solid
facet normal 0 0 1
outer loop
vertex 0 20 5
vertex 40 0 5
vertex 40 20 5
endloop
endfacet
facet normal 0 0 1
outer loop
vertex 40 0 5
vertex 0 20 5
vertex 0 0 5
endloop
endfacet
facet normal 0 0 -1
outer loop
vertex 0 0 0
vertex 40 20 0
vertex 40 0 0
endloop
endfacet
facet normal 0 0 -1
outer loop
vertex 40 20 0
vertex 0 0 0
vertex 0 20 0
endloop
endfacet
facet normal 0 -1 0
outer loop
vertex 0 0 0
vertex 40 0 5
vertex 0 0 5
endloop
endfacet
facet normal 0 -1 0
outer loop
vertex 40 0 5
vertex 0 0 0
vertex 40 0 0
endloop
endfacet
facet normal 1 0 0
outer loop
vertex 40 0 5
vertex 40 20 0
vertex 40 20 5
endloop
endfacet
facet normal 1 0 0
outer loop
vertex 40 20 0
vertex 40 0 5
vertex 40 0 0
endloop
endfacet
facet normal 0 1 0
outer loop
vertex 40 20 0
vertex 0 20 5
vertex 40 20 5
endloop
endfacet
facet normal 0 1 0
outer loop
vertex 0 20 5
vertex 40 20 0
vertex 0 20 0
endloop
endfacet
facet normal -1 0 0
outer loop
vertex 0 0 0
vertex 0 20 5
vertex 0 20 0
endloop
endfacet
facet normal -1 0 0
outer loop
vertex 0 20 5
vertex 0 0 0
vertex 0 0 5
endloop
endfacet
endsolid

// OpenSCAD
// Product name: TODO
// Version: v0.1
// Units: millimeters
// Author/source: TODO
// License/commercial status: TODO
// Use mode: personal / classroom / business-commercial / repair-replacement / reference-only
// Safety notes: TODO
// Print notes: TODO
// Slicer notes: verify scale, supports, orientation, and material in Bambu Studio
// Version history:
// - v0.1: placeholder template

width = 40;
depth = 20;
height = 5;

// Replace this placeholder geometry with the actual model.
cube([width, depth, height]);
